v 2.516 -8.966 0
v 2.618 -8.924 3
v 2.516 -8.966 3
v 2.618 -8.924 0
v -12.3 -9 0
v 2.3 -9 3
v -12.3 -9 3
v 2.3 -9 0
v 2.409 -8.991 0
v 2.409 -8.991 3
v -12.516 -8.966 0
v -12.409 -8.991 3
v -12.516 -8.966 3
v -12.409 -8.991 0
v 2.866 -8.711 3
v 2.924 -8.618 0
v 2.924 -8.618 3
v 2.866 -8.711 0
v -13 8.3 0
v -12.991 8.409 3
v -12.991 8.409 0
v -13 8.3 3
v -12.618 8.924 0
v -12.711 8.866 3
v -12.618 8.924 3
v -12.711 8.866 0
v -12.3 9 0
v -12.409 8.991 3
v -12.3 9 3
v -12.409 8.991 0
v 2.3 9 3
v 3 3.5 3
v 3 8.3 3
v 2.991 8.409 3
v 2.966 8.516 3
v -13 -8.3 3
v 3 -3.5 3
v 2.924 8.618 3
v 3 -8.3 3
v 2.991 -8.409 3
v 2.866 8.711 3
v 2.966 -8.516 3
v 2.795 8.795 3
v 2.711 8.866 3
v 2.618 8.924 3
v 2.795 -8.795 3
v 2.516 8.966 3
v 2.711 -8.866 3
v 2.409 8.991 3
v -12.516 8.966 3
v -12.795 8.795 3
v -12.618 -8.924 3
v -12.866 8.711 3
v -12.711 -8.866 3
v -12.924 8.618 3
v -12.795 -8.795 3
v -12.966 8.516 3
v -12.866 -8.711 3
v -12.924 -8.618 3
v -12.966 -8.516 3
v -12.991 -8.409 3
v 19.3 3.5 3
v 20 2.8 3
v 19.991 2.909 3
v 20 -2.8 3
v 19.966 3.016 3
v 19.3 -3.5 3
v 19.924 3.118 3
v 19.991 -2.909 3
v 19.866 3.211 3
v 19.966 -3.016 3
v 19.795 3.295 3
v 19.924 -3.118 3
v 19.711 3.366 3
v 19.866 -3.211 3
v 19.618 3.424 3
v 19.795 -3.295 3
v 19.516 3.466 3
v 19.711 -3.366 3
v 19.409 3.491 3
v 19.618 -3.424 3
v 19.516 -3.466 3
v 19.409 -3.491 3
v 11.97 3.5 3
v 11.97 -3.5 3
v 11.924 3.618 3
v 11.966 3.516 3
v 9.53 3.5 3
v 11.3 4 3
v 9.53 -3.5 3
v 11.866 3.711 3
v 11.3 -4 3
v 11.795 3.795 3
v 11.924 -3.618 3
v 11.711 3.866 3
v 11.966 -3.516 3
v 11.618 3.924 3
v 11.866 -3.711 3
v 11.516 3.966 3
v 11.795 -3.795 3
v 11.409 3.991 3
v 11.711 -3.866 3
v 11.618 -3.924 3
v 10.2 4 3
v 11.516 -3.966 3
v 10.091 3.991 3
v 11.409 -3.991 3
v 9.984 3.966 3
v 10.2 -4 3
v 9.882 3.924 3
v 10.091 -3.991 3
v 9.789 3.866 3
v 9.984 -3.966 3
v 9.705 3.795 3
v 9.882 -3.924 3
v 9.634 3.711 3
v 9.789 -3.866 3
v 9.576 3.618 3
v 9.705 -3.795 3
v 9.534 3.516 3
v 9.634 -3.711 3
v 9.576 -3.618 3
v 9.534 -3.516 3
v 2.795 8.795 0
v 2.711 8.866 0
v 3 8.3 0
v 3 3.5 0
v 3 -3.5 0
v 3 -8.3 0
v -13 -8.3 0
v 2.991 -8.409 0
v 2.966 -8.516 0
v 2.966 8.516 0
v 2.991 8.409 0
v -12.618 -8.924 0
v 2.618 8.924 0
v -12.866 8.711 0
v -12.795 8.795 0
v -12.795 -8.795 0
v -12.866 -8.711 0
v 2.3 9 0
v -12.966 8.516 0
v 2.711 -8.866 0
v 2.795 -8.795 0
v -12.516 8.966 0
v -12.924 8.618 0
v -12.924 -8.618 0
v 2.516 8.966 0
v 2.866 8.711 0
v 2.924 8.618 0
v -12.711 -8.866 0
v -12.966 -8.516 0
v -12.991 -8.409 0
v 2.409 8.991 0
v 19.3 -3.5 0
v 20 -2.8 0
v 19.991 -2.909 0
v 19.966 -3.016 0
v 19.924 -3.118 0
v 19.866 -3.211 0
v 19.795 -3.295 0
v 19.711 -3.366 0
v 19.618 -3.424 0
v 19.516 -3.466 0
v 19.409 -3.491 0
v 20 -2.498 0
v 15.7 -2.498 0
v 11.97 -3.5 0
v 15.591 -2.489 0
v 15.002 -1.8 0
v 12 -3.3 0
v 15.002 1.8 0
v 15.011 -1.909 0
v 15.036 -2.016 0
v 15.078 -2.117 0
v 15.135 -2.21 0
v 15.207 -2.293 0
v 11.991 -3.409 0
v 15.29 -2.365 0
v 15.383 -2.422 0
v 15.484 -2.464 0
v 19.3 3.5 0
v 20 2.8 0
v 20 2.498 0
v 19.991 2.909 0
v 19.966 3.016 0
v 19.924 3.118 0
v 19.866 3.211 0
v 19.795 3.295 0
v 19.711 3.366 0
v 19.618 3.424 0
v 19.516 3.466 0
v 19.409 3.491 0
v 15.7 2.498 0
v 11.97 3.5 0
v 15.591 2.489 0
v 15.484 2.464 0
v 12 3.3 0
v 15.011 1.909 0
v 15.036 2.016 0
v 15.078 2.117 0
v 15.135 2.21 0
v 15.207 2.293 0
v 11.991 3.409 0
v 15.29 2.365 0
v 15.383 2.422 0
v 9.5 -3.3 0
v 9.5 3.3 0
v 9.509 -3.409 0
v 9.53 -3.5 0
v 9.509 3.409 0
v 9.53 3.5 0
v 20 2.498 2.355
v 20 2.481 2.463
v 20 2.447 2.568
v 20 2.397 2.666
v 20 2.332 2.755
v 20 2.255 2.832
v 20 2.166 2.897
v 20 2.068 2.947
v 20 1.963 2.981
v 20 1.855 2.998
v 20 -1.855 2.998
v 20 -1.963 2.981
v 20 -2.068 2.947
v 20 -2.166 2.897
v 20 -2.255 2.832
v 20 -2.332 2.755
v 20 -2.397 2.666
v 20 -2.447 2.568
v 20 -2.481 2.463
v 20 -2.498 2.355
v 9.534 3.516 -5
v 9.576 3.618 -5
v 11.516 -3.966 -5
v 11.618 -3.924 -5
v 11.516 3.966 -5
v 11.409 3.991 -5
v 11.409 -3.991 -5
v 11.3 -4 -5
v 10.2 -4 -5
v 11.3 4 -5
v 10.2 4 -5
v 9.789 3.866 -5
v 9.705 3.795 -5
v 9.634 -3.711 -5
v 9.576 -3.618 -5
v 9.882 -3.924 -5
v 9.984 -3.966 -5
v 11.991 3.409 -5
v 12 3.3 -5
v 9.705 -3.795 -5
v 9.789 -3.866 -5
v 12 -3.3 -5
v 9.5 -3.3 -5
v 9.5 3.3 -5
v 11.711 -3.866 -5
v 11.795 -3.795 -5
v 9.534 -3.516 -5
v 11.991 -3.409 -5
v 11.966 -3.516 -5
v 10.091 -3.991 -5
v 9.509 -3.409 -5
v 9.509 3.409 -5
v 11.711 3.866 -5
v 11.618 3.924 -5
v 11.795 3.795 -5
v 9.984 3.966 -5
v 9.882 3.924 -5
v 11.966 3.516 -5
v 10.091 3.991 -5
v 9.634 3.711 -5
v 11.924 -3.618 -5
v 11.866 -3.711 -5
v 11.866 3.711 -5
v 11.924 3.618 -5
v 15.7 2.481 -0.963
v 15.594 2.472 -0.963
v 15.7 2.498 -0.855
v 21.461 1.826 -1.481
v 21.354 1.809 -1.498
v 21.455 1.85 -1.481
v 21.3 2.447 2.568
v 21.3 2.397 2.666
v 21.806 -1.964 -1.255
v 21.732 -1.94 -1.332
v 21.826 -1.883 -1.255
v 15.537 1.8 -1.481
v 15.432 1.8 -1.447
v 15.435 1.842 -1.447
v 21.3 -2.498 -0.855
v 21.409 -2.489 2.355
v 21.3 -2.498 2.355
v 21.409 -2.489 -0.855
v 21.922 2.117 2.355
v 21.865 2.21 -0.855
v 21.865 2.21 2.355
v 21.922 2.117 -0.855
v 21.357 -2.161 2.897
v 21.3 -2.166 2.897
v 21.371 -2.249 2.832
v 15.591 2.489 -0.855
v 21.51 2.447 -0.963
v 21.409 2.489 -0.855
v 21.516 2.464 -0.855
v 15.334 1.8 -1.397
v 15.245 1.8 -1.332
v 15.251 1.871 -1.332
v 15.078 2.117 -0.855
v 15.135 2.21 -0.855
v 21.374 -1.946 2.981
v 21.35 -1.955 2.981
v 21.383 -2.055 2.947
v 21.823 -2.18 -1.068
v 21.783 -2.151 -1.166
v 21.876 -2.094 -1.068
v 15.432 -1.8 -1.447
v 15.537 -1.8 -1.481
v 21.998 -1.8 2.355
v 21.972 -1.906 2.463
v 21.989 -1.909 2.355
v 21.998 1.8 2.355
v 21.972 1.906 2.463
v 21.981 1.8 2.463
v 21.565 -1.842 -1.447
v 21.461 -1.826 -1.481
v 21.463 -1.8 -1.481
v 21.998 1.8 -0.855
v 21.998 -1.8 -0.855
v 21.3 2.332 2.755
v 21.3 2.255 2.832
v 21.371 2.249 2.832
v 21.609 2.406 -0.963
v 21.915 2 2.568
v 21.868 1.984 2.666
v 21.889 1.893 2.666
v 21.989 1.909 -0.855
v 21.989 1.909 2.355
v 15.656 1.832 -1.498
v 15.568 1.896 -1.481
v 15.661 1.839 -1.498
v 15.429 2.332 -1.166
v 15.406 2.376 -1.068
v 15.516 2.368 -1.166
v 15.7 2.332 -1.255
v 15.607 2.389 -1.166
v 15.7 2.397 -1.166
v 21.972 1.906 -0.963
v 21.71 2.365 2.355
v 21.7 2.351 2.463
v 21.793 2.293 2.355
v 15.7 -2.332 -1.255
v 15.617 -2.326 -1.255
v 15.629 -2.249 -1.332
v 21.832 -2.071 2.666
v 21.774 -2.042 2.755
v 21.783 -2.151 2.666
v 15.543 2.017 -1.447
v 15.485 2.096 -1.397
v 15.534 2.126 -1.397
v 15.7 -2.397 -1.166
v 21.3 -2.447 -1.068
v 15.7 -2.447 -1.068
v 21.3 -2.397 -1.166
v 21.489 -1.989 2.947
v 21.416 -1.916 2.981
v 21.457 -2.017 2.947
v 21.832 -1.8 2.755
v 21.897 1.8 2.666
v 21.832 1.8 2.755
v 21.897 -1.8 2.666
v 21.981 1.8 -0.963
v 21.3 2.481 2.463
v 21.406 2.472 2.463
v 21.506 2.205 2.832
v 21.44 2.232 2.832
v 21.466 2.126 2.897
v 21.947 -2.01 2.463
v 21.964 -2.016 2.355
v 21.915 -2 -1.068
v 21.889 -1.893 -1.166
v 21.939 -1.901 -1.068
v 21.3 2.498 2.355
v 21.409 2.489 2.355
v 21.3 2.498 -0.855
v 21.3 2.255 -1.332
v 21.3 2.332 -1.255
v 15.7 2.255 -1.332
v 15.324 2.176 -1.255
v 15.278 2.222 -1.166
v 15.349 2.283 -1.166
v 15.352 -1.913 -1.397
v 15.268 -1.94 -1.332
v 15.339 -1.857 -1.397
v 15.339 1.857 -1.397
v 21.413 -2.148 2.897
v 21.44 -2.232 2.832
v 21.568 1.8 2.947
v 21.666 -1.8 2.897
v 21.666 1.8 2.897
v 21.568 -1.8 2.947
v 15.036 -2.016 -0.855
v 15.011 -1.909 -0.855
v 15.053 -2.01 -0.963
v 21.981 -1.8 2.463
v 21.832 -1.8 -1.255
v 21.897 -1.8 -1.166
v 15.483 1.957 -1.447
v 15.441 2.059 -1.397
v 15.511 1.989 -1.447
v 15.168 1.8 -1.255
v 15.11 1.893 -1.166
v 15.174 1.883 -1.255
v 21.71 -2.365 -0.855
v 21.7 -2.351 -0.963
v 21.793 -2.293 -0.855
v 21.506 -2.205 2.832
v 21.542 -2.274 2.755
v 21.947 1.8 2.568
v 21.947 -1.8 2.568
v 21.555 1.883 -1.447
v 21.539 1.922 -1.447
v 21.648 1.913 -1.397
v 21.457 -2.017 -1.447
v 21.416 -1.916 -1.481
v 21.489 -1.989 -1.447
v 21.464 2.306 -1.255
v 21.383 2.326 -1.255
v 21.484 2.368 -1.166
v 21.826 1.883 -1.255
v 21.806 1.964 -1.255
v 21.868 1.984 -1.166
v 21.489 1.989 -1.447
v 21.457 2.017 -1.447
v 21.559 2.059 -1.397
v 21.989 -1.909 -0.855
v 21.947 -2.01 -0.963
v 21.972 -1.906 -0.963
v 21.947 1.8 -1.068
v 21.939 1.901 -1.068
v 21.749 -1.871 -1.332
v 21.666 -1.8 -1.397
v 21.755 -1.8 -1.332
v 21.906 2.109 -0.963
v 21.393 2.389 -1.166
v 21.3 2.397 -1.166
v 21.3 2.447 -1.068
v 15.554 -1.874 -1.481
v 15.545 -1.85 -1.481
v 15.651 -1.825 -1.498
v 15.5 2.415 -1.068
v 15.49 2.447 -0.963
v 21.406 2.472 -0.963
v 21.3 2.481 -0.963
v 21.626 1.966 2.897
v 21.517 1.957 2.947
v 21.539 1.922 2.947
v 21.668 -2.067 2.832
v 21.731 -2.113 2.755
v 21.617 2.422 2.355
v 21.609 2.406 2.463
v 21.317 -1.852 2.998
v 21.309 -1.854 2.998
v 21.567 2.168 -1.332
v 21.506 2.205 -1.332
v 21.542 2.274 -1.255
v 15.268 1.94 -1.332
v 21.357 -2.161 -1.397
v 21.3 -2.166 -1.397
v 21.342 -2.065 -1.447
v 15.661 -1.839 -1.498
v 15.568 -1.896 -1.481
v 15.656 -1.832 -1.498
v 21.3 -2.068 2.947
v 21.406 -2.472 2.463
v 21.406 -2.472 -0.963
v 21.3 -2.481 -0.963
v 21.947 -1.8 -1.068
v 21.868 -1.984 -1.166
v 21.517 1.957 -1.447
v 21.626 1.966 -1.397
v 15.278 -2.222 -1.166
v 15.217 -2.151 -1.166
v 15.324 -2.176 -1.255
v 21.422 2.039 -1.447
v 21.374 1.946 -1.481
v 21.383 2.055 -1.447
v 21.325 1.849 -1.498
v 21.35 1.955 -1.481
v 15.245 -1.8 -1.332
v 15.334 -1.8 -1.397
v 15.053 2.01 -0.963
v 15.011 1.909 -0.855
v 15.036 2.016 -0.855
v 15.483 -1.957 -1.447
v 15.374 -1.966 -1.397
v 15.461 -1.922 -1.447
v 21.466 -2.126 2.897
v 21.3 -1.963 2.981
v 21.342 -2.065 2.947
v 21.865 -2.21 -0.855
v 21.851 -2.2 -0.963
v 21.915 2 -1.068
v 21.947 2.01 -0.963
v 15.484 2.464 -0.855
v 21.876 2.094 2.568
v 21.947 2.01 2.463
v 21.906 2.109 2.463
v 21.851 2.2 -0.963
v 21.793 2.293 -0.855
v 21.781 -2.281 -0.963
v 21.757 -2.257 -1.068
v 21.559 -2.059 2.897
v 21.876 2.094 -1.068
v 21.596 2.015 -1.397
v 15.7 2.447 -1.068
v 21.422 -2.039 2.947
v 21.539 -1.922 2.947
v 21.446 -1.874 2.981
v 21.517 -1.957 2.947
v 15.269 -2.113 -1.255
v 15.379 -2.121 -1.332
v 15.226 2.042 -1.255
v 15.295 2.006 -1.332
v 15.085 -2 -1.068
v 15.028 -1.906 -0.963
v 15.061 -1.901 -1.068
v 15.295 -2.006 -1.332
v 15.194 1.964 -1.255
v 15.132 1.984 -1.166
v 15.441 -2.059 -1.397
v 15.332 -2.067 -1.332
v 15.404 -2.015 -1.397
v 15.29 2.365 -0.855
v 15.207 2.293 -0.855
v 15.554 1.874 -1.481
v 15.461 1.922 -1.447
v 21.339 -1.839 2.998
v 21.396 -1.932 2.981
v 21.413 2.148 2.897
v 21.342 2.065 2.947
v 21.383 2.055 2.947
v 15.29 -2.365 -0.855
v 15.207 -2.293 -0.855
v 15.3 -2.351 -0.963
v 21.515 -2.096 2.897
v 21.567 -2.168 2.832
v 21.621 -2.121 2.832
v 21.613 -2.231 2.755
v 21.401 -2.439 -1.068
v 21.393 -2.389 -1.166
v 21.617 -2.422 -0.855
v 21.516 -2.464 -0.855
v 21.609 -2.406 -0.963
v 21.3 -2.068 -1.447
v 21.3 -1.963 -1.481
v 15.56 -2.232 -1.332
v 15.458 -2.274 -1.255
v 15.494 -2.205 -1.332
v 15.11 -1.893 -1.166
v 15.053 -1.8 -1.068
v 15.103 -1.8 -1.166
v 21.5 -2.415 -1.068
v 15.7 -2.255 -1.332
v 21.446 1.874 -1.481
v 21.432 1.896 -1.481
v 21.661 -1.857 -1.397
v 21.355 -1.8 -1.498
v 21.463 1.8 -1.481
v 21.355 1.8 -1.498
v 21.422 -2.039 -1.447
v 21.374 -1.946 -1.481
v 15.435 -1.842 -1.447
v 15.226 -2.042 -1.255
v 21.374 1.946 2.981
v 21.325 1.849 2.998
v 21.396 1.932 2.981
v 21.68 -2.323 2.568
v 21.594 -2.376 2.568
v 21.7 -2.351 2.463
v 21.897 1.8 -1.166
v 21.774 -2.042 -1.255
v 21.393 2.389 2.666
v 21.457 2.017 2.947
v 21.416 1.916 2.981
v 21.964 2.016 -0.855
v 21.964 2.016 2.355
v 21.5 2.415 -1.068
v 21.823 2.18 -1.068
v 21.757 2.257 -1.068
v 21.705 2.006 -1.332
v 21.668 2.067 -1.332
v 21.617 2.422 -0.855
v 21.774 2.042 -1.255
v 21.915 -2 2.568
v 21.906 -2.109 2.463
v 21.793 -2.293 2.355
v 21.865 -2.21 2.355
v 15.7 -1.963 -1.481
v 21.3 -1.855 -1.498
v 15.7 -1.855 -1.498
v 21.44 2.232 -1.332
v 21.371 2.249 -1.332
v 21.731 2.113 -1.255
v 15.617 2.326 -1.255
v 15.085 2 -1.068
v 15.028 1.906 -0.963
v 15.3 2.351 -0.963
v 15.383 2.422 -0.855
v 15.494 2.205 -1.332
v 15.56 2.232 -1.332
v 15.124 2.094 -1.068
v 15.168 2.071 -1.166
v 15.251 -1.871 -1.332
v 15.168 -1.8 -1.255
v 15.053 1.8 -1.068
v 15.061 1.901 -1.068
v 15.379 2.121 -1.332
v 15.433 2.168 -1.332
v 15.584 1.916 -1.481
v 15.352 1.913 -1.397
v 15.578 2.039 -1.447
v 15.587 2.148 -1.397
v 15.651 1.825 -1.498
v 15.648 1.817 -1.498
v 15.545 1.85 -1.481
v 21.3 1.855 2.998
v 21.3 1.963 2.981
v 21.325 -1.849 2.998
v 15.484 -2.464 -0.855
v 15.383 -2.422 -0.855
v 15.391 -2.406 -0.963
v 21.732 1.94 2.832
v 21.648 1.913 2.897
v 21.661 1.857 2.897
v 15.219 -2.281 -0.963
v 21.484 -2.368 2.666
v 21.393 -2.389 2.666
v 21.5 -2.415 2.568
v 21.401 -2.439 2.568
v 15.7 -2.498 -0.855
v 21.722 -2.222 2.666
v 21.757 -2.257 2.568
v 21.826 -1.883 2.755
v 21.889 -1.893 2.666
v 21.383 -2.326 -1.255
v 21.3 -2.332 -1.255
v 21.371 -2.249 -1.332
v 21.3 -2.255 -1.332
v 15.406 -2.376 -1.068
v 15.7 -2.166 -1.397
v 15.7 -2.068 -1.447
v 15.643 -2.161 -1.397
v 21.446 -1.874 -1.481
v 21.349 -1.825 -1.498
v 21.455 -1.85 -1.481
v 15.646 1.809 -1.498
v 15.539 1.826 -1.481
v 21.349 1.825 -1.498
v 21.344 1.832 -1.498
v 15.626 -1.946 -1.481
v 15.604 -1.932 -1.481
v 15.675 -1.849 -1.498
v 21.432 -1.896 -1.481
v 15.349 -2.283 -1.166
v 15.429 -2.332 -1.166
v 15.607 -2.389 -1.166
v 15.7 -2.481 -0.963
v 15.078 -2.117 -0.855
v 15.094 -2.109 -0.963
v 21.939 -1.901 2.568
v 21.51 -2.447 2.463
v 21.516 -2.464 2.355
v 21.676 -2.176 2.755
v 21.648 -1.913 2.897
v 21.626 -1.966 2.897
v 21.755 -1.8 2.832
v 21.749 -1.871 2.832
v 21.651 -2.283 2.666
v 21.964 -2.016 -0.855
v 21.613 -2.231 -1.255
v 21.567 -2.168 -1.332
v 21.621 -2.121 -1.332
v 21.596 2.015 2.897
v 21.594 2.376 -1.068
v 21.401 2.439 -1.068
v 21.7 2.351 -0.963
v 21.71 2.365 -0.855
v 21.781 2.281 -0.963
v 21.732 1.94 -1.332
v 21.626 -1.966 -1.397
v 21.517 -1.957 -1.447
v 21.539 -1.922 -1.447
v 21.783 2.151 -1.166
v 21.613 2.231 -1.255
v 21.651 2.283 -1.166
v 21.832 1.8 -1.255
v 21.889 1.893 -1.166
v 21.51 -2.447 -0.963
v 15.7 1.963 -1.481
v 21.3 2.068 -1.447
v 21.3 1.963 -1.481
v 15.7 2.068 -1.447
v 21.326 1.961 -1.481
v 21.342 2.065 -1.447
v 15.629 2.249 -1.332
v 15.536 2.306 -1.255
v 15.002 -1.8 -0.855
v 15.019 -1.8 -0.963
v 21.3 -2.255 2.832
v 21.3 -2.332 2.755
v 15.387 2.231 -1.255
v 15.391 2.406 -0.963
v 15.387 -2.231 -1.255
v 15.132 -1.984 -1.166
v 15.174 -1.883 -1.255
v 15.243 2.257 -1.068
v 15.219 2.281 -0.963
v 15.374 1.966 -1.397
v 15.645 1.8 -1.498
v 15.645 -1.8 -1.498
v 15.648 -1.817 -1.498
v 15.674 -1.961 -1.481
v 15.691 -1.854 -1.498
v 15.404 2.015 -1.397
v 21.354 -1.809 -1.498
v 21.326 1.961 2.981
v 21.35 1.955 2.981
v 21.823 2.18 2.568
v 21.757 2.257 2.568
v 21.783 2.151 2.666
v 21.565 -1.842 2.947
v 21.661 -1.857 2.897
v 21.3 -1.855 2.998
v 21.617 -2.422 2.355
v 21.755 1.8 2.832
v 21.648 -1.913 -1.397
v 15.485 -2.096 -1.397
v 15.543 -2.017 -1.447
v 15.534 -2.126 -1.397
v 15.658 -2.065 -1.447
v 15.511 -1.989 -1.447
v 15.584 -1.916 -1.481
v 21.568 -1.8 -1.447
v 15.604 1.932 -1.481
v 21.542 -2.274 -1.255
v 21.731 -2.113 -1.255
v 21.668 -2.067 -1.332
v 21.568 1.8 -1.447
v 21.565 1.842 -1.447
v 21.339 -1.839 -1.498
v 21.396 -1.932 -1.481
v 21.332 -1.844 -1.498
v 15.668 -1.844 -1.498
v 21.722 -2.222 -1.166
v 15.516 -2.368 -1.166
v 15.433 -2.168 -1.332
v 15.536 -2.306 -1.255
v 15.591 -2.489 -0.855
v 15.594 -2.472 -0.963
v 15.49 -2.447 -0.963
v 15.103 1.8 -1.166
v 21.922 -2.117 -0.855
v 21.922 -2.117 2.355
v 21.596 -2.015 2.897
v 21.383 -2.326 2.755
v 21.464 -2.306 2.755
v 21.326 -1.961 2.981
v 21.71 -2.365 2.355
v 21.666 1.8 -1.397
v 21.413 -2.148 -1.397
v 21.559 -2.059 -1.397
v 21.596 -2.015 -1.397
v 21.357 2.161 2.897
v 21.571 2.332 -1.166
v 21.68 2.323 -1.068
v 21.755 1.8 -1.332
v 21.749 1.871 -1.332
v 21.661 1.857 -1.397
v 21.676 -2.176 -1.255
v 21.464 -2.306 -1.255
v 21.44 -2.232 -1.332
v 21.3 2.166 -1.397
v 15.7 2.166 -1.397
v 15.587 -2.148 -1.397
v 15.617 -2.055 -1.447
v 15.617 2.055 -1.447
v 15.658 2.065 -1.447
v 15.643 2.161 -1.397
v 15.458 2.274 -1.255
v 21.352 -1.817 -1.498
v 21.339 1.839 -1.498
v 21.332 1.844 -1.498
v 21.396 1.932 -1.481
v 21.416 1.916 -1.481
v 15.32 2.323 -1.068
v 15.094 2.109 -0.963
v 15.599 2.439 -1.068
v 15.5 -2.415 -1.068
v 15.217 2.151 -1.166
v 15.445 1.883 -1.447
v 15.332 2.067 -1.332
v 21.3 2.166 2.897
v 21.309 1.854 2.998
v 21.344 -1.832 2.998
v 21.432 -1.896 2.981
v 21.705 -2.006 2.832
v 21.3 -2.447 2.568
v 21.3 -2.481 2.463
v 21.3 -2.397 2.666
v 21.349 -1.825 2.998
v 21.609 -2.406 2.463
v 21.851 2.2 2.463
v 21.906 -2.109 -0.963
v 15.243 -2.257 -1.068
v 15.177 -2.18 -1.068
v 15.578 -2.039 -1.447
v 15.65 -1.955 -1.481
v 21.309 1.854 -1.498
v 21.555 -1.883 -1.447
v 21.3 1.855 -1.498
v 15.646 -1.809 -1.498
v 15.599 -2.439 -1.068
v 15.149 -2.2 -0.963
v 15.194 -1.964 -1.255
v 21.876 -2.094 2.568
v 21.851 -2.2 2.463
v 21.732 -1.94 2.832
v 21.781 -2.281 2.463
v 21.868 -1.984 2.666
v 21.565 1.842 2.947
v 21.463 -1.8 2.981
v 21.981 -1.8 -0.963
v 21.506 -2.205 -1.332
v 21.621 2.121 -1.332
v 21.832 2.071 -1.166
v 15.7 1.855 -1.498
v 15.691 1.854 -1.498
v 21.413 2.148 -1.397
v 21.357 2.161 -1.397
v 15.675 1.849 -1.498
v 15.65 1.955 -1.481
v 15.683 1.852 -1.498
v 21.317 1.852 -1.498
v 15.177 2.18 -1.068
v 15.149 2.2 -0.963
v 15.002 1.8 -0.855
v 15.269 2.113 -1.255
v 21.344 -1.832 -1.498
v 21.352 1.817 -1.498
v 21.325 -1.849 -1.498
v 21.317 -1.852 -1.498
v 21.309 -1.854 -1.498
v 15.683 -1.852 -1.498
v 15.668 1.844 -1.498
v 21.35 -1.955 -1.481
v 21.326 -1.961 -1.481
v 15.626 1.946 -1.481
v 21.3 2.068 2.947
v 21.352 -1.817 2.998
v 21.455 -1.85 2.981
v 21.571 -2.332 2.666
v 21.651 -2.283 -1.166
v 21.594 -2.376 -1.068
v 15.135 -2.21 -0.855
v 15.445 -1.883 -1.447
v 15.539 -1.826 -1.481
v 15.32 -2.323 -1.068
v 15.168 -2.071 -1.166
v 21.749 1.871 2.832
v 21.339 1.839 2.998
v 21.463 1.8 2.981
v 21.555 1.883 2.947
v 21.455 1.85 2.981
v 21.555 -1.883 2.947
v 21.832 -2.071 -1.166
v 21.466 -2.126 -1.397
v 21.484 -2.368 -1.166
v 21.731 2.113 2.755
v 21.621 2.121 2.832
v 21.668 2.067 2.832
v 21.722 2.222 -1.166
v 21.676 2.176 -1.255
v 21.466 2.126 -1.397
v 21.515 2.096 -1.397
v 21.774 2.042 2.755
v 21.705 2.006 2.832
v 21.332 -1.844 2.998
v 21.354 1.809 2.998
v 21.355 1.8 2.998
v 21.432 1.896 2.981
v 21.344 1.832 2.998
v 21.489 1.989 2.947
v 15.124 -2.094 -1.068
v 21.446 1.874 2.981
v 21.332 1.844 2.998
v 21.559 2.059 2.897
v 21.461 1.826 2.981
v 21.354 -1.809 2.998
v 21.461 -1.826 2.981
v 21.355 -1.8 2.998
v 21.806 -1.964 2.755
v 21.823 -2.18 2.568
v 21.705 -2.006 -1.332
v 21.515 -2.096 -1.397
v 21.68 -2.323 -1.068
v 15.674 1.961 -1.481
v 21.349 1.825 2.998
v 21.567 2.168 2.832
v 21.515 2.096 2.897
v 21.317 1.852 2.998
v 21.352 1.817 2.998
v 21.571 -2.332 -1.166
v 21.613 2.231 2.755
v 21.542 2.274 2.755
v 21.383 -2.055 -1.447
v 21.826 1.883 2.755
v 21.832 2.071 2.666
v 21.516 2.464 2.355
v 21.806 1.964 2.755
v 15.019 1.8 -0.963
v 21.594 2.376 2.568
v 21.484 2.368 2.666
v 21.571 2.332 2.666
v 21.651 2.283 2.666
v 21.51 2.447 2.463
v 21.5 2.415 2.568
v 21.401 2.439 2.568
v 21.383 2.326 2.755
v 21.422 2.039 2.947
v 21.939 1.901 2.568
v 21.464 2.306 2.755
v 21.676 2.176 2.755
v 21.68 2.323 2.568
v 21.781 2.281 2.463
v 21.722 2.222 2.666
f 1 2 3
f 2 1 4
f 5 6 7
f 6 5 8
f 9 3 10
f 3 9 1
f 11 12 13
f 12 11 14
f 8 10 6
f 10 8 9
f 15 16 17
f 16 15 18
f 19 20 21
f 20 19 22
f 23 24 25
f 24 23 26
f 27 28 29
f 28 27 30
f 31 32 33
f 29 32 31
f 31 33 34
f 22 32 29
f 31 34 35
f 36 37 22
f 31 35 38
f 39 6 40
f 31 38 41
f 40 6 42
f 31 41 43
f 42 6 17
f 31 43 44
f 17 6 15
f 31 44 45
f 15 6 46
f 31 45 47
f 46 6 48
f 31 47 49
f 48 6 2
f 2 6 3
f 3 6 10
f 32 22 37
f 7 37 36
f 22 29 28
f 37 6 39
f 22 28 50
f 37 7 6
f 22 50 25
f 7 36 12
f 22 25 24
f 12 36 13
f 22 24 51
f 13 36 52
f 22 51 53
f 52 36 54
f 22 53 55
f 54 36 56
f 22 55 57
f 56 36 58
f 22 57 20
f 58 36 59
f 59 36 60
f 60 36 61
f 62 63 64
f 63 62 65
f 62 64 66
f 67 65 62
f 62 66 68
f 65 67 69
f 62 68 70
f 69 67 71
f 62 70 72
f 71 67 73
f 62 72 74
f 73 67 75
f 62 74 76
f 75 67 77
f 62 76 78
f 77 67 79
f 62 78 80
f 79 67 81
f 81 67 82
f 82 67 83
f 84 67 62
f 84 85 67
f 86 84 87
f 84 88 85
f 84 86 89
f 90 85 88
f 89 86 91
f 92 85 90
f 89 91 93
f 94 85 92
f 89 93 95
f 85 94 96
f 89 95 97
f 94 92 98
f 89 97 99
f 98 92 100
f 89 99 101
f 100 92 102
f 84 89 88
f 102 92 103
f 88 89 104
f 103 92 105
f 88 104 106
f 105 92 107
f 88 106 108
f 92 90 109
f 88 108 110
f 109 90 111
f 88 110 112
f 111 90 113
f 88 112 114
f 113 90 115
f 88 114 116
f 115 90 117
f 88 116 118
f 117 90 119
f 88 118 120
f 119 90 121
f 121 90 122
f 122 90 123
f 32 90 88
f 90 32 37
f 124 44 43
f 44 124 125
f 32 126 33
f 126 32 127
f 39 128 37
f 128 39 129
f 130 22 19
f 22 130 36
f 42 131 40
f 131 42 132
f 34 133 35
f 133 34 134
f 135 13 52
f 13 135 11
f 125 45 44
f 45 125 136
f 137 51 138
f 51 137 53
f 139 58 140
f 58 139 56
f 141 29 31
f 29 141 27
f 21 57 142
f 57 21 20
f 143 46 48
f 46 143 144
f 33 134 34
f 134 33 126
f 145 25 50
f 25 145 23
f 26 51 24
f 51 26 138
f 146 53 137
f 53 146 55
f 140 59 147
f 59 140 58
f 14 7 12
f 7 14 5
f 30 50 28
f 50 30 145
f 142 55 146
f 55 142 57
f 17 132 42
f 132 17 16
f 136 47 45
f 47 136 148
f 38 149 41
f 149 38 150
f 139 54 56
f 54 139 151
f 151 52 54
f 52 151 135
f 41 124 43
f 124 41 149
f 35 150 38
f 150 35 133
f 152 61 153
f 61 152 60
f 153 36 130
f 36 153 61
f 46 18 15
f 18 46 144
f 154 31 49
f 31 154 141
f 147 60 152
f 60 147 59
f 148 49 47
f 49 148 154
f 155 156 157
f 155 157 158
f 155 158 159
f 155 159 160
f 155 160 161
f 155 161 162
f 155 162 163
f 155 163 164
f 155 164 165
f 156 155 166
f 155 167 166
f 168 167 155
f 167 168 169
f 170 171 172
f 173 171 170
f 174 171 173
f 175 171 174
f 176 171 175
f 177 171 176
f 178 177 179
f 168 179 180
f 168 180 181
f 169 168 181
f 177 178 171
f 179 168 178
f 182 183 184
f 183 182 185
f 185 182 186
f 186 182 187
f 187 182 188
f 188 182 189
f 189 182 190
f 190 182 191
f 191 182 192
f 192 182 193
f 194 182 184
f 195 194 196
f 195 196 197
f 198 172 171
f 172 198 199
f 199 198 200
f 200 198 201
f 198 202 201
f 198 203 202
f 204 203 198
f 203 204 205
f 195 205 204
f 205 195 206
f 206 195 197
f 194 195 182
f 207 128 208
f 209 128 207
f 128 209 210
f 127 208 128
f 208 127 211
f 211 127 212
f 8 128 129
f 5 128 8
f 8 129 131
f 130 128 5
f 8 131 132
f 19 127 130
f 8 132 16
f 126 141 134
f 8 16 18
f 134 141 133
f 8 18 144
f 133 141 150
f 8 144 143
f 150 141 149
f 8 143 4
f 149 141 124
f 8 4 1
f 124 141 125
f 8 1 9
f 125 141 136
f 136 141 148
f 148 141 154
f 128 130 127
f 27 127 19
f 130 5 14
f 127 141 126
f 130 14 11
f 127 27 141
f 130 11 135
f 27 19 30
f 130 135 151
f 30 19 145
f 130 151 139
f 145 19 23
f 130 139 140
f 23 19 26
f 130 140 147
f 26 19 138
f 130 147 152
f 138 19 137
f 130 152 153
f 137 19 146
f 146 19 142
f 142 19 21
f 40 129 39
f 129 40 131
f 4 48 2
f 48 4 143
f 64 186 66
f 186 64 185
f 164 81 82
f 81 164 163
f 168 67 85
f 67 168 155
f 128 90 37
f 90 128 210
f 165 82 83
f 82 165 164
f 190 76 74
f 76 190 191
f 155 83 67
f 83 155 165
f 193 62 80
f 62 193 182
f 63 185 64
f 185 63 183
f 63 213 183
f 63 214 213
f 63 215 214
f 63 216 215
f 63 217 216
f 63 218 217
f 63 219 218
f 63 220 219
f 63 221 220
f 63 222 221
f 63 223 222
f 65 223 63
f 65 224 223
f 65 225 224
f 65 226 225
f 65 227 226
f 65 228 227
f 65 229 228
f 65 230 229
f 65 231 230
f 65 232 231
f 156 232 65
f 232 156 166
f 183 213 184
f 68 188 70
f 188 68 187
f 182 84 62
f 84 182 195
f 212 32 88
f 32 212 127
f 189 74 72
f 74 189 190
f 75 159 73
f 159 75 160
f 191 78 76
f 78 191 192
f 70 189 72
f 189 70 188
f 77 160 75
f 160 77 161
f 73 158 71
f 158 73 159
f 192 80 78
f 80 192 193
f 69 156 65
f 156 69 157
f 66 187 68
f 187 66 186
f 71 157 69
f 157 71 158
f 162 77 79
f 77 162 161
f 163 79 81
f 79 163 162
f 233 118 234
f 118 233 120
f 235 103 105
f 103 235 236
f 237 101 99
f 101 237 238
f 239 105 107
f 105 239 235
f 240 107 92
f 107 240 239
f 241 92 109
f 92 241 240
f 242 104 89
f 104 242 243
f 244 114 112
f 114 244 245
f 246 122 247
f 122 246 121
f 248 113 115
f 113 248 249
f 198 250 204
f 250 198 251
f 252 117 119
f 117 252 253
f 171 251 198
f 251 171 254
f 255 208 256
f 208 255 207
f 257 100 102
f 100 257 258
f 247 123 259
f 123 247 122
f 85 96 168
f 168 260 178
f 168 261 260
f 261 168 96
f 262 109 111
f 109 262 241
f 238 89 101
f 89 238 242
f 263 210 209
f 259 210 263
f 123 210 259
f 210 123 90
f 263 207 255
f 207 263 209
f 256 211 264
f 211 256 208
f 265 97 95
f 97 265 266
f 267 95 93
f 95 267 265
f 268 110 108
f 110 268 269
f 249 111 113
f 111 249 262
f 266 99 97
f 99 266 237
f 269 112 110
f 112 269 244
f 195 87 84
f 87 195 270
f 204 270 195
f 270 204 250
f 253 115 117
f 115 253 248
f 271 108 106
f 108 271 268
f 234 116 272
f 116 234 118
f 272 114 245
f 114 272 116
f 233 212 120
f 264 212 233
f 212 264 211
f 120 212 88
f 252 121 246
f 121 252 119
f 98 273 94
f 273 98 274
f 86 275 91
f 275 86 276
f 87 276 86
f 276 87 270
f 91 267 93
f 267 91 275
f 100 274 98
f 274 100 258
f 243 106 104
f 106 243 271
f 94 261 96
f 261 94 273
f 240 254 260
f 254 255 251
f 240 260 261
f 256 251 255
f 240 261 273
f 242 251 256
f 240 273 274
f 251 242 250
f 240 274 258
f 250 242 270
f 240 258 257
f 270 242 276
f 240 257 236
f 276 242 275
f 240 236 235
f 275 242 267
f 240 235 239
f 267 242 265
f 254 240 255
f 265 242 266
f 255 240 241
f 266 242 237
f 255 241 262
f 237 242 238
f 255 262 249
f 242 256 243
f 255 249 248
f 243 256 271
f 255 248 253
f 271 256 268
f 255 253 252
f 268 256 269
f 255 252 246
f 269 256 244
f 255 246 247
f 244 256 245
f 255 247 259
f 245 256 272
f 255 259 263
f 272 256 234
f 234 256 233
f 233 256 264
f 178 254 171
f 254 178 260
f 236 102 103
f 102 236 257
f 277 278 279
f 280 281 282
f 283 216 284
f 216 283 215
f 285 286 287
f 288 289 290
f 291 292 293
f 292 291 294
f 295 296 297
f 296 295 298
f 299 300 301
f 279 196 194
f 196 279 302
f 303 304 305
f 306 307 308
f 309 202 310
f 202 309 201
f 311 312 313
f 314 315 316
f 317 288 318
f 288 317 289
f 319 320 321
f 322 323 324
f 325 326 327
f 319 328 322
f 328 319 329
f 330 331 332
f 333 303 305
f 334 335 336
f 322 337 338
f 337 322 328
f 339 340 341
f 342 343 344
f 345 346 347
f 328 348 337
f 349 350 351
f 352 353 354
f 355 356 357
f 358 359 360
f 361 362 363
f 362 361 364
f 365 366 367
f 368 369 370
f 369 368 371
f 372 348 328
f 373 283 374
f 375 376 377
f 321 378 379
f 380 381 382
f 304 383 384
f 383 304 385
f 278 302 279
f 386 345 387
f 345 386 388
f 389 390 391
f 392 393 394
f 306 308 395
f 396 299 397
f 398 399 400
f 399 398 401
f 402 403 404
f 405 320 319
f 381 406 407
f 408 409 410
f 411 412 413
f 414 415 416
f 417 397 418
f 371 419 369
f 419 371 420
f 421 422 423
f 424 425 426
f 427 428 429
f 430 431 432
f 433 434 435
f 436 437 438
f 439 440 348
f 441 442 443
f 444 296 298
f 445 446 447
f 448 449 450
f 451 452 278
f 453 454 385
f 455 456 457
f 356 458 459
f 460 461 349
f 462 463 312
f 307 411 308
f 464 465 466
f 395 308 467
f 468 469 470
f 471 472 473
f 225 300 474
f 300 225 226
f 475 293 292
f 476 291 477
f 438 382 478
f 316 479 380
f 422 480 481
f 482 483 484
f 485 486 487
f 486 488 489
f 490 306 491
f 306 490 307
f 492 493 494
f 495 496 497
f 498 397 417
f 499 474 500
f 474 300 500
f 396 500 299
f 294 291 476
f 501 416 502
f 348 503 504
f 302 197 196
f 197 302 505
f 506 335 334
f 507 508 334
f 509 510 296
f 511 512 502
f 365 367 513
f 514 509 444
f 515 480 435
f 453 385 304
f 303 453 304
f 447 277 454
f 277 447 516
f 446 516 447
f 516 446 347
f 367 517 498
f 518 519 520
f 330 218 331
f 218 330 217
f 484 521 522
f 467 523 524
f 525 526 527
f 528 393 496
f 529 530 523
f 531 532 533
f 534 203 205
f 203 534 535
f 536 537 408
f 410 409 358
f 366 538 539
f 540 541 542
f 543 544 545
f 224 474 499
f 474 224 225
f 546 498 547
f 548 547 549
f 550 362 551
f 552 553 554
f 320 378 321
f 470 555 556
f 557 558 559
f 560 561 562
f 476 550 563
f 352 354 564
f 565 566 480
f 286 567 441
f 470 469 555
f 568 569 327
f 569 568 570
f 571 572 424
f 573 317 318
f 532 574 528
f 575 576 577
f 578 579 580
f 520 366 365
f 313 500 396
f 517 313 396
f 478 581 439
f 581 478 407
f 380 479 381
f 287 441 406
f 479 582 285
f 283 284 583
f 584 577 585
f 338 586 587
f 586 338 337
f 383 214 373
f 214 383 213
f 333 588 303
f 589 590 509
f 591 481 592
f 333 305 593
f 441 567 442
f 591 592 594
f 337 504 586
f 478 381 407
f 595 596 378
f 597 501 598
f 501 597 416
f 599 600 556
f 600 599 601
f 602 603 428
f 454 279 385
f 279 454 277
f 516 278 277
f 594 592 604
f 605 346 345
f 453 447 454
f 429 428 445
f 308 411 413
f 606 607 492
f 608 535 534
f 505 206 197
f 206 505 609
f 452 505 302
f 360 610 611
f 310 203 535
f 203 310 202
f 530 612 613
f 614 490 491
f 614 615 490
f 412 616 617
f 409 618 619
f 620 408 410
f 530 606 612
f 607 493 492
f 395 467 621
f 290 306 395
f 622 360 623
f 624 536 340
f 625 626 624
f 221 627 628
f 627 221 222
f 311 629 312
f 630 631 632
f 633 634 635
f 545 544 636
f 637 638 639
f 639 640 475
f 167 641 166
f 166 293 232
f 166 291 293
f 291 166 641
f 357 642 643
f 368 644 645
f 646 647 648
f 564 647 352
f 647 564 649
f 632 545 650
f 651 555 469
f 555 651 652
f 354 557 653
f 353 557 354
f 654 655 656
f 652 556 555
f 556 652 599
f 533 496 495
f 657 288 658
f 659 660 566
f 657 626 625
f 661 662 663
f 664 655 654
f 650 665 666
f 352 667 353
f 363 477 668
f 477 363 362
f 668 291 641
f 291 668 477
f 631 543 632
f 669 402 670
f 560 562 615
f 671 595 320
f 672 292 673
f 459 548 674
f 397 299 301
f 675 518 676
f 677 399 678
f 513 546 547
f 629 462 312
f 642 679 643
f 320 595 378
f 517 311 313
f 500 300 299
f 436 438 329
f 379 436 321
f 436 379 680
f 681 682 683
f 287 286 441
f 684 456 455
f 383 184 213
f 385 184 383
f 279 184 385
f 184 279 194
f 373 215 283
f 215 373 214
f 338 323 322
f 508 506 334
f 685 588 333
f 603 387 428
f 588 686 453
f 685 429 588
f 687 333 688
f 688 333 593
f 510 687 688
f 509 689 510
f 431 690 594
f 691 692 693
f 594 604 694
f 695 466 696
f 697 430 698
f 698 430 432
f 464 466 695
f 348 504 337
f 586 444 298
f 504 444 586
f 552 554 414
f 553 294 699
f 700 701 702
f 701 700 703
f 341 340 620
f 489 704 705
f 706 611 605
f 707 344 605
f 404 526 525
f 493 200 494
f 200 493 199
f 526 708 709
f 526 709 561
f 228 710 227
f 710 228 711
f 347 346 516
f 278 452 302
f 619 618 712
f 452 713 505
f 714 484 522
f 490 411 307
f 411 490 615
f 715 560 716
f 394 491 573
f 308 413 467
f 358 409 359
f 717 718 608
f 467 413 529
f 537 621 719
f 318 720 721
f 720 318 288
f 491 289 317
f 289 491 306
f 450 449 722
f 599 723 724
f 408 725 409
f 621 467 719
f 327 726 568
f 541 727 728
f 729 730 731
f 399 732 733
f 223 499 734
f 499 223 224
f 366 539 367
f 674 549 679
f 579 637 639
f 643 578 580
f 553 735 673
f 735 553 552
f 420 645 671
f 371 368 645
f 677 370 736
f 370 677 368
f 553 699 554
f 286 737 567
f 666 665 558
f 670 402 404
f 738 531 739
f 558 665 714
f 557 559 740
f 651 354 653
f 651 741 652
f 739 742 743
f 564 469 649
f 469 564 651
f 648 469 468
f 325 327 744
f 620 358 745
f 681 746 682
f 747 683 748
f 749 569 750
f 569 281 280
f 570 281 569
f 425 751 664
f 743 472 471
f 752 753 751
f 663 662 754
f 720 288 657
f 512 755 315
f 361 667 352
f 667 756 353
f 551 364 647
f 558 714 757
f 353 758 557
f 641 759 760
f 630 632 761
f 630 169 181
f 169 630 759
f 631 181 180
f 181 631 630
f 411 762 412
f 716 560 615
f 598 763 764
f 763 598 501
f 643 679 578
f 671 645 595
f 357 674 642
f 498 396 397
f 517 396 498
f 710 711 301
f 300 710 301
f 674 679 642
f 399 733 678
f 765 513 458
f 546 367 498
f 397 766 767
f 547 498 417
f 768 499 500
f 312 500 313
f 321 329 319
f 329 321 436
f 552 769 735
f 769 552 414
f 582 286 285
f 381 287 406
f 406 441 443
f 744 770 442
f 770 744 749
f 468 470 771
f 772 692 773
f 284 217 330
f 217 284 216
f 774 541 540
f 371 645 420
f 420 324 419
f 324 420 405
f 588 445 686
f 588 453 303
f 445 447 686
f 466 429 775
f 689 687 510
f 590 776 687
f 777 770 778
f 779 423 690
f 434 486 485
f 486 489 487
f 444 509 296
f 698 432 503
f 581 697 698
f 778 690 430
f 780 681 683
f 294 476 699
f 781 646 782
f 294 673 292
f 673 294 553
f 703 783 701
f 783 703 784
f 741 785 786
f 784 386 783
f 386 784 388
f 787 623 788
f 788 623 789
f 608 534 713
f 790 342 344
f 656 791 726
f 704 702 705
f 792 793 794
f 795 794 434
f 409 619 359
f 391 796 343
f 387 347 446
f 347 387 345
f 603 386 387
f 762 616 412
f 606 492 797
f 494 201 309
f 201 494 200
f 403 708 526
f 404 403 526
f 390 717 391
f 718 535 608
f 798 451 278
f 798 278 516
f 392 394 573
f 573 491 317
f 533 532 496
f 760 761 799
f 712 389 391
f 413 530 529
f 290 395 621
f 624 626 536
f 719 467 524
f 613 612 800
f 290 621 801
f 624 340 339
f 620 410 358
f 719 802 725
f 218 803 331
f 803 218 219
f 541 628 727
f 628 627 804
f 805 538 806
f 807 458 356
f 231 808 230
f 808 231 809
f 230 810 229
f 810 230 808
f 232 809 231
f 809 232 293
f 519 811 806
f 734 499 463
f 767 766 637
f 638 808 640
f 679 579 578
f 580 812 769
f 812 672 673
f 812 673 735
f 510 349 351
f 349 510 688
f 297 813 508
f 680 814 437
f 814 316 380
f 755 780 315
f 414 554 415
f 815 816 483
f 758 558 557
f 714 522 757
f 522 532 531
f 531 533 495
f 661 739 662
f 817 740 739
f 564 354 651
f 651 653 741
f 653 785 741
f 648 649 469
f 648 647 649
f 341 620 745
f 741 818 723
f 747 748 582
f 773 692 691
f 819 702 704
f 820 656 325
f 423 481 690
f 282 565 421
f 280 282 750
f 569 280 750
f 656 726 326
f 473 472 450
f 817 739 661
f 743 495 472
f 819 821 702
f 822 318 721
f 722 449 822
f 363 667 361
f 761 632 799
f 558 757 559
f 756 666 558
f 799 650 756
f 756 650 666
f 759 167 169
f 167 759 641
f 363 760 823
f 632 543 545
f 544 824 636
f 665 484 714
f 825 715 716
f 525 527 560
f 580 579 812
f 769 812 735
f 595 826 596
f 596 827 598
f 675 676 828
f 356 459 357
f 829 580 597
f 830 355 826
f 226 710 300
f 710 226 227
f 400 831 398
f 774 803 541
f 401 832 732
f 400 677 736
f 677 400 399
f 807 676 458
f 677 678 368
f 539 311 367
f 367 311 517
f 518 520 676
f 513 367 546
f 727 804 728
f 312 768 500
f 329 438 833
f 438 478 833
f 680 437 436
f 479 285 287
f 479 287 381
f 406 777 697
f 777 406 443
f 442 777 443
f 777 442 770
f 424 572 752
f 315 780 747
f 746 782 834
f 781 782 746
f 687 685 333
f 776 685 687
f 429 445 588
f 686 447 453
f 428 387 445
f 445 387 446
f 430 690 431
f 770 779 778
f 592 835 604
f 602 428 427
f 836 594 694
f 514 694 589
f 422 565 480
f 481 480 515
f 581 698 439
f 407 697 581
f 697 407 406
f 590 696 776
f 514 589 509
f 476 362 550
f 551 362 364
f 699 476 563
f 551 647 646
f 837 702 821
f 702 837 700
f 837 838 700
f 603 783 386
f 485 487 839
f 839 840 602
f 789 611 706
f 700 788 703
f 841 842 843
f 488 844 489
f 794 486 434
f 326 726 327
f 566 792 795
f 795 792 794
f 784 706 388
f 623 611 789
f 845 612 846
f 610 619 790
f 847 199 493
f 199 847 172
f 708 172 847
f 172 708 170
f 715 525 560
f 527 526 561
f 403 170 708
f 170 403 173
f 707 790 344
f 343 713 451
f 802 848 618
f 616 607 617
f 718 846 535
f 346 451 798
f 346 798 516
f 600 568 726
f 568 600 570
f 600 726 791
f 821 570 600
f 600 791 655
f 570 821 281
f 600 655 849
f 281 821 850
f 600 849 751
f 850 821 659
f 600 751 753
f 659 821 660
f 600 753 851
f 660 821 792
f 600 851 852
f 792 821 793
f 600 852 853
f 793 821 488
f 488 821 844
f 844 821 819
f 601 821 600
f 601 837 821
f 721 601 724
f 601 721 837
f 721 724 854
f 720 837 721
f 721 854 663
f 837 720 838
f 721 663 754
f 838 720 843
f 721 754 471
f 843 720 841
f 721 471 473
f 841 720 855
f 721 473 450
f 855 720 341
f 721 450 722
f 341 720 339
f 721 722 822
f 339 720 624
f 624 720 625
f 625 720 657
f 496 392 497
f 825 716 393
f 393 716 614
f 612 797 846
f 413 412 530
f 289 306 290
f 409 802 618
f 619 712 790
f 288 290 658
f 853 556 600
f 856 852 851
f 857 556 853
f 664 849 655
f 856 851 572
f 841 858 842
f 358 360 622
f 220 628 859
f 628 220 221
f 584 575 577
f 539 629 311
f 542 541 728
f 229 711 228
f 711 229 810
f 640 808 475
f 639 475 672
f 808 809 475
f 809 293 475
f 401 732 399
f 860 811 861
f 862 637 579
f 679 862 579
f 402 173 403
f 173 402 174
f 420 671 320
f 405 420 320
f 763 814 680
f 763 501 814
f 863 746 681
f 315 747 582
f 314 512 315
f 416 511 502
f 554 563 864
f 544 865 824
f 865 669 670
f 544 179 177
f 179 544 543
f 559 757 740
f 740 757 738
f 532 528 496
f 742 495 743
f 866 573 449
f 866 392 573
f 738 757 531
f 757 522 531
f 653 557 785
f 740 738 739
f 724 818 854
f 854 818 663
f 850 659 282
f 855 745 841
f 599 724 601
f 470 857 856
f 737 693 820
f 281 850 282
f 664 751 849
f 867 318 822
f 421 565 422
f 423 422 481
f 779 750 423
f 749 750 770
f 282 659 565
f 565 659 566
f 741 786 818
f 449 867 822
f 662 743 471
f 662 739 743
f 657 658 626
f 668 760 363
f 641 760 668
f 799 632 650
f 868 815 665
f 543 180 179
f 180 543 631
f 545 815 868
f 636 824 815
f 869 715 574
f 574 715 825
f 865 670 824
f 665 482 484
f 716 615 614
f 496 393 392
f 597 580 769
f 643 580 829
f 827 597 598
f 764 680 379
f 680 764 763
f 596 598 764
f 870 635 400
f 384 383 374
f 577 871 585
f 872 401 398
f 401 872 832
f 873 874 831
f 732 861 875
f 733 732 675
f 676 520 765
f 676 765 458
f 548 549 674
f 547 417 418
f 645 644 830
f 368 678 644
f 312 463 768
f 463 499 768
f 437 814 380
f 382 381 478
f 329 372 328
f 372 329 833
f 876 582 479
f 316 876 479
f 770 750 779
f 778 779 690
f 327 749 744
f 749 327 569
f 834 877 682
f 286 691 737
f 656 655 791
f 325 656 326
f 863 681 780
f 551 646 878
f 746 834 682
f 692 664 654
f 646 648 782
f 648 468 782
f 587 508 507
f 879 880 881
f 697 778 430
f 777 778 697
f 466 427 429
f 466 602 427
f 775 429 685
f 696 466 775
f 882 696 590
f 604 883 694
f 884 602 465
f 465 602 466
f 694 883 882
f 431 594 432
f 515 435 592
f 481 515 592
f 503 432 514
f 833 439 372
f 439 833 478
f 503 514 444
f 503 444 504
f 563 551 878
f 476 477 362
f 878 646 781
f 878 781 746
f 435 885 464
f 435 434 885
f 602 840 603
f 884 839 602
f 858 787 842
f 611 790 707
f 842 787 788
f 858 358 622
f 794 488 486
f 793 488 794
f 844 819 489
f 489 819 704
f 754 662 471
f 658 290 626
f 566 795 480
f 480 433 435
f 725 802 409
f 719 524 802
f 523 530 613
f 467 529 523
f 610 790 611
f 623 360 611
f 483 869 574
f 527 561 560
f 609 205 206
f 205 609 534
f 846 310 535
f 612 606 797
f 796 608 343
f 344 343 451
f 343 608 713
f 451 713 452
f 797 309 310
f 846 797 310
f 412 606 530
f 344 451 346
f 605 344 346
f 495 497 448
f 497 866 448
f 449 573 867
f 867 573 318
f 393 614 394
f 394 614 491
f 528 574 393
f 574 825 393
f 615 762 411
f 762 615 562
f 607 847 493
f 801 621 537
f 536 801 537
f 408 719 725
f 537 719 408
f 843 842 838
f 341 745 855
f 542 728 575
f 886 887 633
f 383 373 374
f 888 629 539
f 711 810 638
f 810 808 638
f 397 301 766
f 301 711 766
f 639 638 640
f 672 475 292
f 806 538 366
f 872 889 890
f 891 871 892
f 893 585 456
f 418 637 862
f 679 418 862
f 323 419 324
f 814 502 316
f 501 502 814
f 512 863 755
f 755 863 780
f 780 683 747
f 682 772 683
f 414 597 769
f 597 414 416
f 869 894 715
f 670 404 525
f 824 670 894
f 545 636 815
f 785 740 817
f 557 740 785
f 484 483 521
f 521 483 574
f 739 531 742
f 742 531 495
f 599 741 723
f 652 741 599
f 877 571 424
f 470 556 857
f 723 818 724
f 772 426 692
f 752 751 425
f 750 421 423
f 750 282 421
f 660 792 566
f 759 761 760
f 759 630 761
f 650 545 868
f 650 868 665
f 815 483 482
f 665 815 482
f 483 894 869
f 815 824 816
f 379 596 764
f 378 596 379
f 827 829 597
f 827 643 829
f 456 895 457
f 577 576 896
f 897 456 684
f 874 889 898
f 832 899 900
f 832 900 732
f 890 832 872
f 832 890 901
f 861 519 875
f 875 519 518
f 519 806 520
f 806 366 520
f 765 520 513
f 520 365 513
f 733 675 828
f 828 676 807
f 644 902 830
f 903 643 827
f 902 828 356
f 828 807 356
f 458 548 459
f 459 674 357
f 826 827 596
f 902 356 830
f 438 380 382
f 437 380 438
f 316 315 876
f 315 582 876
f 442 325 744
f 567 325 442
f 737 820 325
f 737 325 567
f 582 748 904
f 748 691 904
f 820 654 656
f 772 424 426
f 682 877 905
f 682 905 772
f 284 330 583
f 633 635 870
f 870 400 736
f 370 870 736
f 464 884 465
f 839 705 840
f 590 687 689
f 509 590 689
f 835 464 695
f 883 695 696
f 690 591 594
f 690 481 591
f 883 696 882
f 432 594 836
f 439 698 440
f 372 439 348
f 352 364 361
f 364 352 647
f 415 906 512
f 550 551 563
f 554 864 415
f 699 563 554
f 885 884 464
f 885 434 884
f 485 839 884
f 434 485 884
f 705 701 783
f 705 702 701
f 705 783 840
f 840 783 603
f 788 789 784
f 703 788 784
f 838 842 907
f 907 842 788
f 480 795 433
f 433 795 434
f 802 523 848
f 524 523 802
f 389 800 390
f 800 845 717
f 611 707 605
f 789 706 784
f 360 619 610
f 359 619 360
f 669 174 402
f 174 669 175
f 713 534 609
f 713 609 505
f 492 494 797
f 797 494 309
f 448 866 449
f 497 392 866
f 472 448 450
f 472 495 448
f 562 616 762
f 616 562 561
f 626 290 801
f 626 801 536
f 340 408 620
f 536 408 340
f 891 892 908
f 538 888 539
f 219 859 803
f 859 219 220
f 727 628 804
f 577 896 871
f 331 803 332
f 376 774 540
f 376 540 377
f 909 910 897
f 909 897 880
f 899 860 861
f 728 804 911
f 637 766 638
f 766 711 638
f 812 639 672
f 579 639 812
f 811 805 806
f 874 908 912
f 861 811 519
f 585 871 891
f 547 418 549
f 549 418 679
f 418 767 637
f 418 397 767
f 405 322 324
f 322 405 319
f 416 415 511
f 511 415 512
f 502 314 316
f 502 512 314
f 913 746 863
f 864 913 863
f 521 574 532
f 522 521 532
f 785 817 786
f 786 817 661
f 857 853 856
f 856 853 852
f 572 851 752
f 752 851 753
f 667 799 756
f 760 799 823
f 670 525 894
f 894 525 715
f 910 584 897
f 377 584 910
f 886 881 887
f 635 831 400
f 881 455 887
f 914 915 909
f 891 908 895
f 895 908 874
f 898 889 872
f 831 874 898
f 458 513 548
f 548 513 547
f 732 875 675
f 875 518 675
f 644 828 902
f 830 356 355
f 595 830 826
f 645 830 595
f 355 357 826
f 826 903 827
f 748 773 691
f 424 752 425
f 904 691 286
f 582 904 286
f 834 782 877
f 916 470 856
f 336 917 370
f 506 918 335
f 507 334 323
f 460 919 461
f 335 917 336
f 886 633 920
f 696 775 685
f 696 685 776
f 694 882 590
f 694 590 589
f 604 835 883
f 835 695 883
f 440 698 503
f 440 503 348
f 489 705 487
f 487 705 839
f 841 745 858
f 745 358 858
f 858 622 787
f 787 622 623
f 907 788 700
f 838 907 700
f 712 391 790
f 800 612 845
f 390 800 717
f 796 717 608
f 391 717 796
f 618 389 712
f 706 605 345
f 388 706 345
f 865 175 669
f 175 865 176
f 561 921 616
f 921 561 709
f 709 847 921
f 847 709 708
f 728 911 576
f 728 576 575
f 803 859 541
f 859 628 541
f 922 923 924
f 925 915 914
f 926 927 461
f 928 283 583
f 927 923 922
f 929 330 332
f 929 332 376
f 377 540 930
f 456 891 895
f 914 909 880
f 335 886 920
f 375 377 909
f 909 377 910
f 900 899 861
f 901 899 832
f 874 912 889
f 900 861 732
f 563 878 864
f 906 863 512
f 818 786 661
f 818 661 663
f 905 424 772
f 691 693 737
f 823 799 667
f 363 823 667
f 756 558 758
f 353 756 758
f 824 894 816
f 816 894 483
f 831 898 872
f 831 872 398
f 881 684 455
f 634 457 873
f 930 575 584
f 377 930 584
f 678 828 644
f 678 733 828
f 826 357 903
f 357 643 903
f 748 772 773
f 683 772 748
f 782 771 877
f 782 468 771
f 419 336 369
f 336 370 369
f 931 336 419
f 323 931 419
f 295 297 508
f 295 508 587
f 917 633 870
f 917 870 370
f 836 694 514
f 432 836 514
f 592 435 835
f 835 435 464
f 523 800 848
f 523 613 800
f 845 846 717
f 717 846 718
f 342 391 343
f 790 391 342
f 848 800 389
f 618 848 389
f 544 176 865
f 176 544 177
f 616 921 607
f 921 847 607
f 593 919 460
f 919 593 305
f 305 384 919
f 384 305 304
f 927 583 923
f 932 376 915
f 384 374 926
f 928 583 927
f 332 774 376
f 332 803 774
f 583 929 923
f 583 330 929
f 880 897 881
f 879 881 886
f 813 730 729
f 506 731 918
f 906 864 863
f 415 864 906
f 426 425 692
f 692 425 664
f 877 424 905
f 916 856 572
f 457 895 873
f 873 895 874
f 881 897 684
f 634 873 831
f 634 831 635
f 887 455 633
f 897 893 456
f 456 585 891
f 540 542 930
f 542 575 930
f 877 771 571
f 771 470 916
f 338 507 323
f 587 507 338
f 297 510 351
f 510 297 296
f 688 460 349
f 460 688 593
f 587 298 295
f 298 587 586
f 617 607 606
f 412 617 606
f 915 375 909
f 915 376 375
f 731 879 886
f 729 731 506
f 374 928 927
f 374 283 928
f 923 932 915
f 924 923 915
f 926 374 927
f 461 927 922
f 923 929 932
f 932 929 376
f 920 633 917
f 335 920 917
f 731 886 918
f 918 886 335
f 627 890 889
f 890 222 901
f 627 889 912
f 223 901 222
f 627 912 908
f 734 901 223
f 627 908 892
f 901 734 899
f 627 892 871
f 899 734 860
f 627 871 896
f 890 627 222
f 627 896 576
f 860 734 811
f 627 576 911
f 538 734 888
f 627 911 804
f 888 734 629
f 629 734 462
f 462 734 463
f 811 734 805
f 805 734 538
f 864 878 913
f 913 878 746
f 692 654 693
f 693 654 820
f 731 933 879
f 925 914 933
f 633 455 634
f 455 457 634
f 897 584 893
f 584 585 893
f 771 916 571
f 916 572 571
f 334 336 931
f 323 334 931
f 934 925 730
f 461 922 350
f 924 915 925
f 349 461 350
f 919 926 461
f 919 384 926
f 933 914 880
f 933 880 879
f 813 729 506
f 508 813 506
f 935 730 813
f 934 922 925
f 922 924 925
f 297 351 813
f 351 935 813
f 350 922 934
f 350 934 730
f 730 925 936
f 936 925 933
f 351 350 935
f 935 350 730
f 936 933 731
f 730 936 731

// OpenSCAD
// file: rj45-latch-release-paddle.scad
// UNMEASURED EXAMPLE dimensions; no standard RJ45 geometry is assumed.
// mm. +X approaches from cable side; -Z presses latch. See README datums.
part = "tool"; // tool, contact_coupon
handle_length = 35;
handle_width = 22;
handle_thickness = 3;
neck_length = 20;
neck_width = 7;
neck_thickness = 3;
junction_overlap = 3;
edge_radius = 0.7;
pad_length = 7;
pad_width = 5;
pad_offset = 3; // shoulder forward plane to pad rear edge, along +X
pad_drop = 1.5; // main underside Z=0 to pad contact plane, along -Z
shoulder_position = 12; // X of the forward stop face, from neck root X=0
shoulder_length = 2.5;
shoulder_width = 8;
shoulder_height = 5; // downward from Z=0; stop is for +X reach, not -Z force
minimum_section = 2; // example minimum retained solid section, not a strength rating
contact_margin = 0.5;
// Measured interface values relative to the shoulder's forward face:
latch_contact_start = 2; // along +X
latch_contact_end = 11;
latch_contact_width = 6;
latch_release_travel = 0.8; // measured downward travel to release
latch_plane_drop = 1.5; // latch contact plane at the chosen alignment, below Z=0
datum_band_bottom = -4.5; // firm external body face, in Z at chosen alignment
datum_band_top = -3;
datum_contact_width = 6; // centered firm face width in Y
socket_mouth_distance = 14; // shoulder face to socket mouth, along +X
allowed_insertion_depth = 12; // maximum allowed tool reach ahead of shoulder
socket_clearance = 2; // minimum distance behind socket mouth, along X
approach_start = 4; // narrow access corridor starts at this X
approach_gap = 10; // corridor width in Y
approach_height = 5; // corridor upper limit above Z=0
approach_depth = 6.5; // corridor lower limit below Z=0
side_clearance = 0.5;
vertical_clearance = 0.5;
coupon_grip_length = 16;
coupon_grip_width = 18;
$fn = 40;

pad_start = shoulder_position + pad_offset;
pad_end = pad_start + pad_length;
forward_end = max(neck_length, pad_end, shoulder_position);

assert(part == "tool" || part == "contact_coupon", "Unknown part selector");
assert(min(handle_length, handle_width, handle_thickness, neck_length,
           neck_width, neck_thickness, junction_overlap, edge_radius, pad_length,
           pad_width, pad_drop, shoulder_position, shoulder_length,
           shoulder_width, shoulder_height, minimum_section, contact_margin,
           latch_contact_width, latch_plane_drop, latch_release_travel, datum_contact_width,
           socket_mouth_distance, allowed_insertion_depth, socket_clearance,
           approach_start, approach_gap, approach_height, approach_depth,
           side_clearance, vertical_clearance, coupon_grip_length,
           coupon_grip_width) > 0, "Dimensions and clearances must be positive");
assert(min(neck_width, neck_thickness, handle_thickness, shoulder_length,
           shoulder_width, pad_length, pad_width) >= minimum_section,
       "Retain minimum neck, junction, pad and shoulder sections");
assert(min(handle_length, handle_width, neck_length, neck_width, pad_length,
           pad_width, shoulder_length, shoulder_width, coupon_grip_length,
           coupon_grip_width, neck_thickness + pad_drop) > 2*edge_radius,
       "Rounding must retain positive profiles and pad contact flats");
assert(handle_width >= neck_width + 2*edge_radius &&
       coupon_grip_width >= neck_width + 2*edge_radius &&
       junction_overlap >= minimum_section &&
       junction_overlap < min(handle_length, coupon_grip_length) - 2*edge_radius &&
       junction_overlap <= approach_start && approach_start < shoulder_position - shoulder_length,
       "Grip junction must overlap neck and remain behind approach corridor");
assert(pad_offset >= contact_margin &&
       pad_start >= latch_contact_start + shoulder_position + contact_margin &&
       pad_end <= latch_contact_end + shoulder_position - contact_margin &&
       pad_width + 2*contact_margin <= latch_contact_width &&
       abs(pad_drop - latch_plane_drop) < 0.0001,
       "Pad must fit measured exposed latch contact at chosen alignment");
// Reach the pad's flat core; nominal overlap can vanish under XYZ rounding.
assert(pad_start + edge_radius + minimum_section <= neck_length &&
       neck_length <= pad_end - edge_radius && pad_width <= neck_width,
       "Pad must overlap a solid neck and retain its rounded forward tip");
assert(shoulder_position - shoulder_length >= approach_start &&
       shoulder_position <= neck_length - edge_radius && shoulder_width >= neck_width &&
       datum_band_bottom < datum_band_top &&
       datum_band_top <= -(pad_drop + latch_release_travel) - contact_margin &&
       -shoulder_height <= datum_band_bottom &&
       neck_thickness - latch_release_travel >= datum_band_top &&
       shoulder_width - 2*edge_radius >= datum_contact_width,
       "Shoulder must be supported and cover firm datum below latch plane");
assert(forward_end - shoulder_position <= allowed_insertion_depth &&
       allowed_insertion_depth <= socket_mouth_distance - socket_clearance,
       "Forward reach must respect allowed insertion and socket-mouth clearance");
assert(max(neck_width, pad_width, shoulder_width) + 2*side_clearance <= approach_gap &&
       max(neck_thickness, handle_thickness) + vertical_clearance <= approach_height &&
       max(pad_drop, shoulder_height) + latch_release_travel + vertical_clearance <= approach_depth,
       "Contact assembly must fit measured approach corridor");

module rounded_profile(length, width) {
    translate([edge_radius, -width/2 + edge_radius])
        offset(r=edge_radius) square([length - 2*edge_radius, width - 2*edge_radius]);
}

module rounded_plate(start, length, width, height, bottom=0) {
    translate([start, 0, bottom]) linear_extrude(height)
        rounded_profile(length, width);
}

// Rounded in XYZ: a broad flat bottom remains, with blunt contact edges.
module latch_pad() {
    hull()
        for (x=[pad_start + edge_radius, pad_end - edge_radius])
            for (y=[-pad_width/2 + edge_radius, pad_width/2 - edge_radius])
                for (z=[-pad_drop + edge_radius, neck_thickness - edge_radius])
                    translate([x,y,z]) sphere(r=edge_radius);
}

module paddle(grip_length, grip_width) {
    union() {
        rounded_plate(junction_overlap - grip_length, grip_length,
                      grip_width, handle_thickness);
        rounded_plate(0, neck_length, neck_width, neck_thickness);
        // Front X face is flat except its Y corner rounds. No hook or clamp.
        rounded_plate(shoulder_position - shoulder_length, shoulder_length,
                      shoulder_width, shoulder_height + neck_thickness, -shoulder_height);
        latch_pad();
    }
}

if (part == "tool") paddle(handle_length, handle_width);
if (part == "contact_coupon") paddle(coupon_grip_length, coupon_grip_width);
// main file
// Same pad, shoulder and neck as the tool; shorter accessible grip only.
include <rj45-latch-release-paddle.scad>
part = "contact_coupon";
